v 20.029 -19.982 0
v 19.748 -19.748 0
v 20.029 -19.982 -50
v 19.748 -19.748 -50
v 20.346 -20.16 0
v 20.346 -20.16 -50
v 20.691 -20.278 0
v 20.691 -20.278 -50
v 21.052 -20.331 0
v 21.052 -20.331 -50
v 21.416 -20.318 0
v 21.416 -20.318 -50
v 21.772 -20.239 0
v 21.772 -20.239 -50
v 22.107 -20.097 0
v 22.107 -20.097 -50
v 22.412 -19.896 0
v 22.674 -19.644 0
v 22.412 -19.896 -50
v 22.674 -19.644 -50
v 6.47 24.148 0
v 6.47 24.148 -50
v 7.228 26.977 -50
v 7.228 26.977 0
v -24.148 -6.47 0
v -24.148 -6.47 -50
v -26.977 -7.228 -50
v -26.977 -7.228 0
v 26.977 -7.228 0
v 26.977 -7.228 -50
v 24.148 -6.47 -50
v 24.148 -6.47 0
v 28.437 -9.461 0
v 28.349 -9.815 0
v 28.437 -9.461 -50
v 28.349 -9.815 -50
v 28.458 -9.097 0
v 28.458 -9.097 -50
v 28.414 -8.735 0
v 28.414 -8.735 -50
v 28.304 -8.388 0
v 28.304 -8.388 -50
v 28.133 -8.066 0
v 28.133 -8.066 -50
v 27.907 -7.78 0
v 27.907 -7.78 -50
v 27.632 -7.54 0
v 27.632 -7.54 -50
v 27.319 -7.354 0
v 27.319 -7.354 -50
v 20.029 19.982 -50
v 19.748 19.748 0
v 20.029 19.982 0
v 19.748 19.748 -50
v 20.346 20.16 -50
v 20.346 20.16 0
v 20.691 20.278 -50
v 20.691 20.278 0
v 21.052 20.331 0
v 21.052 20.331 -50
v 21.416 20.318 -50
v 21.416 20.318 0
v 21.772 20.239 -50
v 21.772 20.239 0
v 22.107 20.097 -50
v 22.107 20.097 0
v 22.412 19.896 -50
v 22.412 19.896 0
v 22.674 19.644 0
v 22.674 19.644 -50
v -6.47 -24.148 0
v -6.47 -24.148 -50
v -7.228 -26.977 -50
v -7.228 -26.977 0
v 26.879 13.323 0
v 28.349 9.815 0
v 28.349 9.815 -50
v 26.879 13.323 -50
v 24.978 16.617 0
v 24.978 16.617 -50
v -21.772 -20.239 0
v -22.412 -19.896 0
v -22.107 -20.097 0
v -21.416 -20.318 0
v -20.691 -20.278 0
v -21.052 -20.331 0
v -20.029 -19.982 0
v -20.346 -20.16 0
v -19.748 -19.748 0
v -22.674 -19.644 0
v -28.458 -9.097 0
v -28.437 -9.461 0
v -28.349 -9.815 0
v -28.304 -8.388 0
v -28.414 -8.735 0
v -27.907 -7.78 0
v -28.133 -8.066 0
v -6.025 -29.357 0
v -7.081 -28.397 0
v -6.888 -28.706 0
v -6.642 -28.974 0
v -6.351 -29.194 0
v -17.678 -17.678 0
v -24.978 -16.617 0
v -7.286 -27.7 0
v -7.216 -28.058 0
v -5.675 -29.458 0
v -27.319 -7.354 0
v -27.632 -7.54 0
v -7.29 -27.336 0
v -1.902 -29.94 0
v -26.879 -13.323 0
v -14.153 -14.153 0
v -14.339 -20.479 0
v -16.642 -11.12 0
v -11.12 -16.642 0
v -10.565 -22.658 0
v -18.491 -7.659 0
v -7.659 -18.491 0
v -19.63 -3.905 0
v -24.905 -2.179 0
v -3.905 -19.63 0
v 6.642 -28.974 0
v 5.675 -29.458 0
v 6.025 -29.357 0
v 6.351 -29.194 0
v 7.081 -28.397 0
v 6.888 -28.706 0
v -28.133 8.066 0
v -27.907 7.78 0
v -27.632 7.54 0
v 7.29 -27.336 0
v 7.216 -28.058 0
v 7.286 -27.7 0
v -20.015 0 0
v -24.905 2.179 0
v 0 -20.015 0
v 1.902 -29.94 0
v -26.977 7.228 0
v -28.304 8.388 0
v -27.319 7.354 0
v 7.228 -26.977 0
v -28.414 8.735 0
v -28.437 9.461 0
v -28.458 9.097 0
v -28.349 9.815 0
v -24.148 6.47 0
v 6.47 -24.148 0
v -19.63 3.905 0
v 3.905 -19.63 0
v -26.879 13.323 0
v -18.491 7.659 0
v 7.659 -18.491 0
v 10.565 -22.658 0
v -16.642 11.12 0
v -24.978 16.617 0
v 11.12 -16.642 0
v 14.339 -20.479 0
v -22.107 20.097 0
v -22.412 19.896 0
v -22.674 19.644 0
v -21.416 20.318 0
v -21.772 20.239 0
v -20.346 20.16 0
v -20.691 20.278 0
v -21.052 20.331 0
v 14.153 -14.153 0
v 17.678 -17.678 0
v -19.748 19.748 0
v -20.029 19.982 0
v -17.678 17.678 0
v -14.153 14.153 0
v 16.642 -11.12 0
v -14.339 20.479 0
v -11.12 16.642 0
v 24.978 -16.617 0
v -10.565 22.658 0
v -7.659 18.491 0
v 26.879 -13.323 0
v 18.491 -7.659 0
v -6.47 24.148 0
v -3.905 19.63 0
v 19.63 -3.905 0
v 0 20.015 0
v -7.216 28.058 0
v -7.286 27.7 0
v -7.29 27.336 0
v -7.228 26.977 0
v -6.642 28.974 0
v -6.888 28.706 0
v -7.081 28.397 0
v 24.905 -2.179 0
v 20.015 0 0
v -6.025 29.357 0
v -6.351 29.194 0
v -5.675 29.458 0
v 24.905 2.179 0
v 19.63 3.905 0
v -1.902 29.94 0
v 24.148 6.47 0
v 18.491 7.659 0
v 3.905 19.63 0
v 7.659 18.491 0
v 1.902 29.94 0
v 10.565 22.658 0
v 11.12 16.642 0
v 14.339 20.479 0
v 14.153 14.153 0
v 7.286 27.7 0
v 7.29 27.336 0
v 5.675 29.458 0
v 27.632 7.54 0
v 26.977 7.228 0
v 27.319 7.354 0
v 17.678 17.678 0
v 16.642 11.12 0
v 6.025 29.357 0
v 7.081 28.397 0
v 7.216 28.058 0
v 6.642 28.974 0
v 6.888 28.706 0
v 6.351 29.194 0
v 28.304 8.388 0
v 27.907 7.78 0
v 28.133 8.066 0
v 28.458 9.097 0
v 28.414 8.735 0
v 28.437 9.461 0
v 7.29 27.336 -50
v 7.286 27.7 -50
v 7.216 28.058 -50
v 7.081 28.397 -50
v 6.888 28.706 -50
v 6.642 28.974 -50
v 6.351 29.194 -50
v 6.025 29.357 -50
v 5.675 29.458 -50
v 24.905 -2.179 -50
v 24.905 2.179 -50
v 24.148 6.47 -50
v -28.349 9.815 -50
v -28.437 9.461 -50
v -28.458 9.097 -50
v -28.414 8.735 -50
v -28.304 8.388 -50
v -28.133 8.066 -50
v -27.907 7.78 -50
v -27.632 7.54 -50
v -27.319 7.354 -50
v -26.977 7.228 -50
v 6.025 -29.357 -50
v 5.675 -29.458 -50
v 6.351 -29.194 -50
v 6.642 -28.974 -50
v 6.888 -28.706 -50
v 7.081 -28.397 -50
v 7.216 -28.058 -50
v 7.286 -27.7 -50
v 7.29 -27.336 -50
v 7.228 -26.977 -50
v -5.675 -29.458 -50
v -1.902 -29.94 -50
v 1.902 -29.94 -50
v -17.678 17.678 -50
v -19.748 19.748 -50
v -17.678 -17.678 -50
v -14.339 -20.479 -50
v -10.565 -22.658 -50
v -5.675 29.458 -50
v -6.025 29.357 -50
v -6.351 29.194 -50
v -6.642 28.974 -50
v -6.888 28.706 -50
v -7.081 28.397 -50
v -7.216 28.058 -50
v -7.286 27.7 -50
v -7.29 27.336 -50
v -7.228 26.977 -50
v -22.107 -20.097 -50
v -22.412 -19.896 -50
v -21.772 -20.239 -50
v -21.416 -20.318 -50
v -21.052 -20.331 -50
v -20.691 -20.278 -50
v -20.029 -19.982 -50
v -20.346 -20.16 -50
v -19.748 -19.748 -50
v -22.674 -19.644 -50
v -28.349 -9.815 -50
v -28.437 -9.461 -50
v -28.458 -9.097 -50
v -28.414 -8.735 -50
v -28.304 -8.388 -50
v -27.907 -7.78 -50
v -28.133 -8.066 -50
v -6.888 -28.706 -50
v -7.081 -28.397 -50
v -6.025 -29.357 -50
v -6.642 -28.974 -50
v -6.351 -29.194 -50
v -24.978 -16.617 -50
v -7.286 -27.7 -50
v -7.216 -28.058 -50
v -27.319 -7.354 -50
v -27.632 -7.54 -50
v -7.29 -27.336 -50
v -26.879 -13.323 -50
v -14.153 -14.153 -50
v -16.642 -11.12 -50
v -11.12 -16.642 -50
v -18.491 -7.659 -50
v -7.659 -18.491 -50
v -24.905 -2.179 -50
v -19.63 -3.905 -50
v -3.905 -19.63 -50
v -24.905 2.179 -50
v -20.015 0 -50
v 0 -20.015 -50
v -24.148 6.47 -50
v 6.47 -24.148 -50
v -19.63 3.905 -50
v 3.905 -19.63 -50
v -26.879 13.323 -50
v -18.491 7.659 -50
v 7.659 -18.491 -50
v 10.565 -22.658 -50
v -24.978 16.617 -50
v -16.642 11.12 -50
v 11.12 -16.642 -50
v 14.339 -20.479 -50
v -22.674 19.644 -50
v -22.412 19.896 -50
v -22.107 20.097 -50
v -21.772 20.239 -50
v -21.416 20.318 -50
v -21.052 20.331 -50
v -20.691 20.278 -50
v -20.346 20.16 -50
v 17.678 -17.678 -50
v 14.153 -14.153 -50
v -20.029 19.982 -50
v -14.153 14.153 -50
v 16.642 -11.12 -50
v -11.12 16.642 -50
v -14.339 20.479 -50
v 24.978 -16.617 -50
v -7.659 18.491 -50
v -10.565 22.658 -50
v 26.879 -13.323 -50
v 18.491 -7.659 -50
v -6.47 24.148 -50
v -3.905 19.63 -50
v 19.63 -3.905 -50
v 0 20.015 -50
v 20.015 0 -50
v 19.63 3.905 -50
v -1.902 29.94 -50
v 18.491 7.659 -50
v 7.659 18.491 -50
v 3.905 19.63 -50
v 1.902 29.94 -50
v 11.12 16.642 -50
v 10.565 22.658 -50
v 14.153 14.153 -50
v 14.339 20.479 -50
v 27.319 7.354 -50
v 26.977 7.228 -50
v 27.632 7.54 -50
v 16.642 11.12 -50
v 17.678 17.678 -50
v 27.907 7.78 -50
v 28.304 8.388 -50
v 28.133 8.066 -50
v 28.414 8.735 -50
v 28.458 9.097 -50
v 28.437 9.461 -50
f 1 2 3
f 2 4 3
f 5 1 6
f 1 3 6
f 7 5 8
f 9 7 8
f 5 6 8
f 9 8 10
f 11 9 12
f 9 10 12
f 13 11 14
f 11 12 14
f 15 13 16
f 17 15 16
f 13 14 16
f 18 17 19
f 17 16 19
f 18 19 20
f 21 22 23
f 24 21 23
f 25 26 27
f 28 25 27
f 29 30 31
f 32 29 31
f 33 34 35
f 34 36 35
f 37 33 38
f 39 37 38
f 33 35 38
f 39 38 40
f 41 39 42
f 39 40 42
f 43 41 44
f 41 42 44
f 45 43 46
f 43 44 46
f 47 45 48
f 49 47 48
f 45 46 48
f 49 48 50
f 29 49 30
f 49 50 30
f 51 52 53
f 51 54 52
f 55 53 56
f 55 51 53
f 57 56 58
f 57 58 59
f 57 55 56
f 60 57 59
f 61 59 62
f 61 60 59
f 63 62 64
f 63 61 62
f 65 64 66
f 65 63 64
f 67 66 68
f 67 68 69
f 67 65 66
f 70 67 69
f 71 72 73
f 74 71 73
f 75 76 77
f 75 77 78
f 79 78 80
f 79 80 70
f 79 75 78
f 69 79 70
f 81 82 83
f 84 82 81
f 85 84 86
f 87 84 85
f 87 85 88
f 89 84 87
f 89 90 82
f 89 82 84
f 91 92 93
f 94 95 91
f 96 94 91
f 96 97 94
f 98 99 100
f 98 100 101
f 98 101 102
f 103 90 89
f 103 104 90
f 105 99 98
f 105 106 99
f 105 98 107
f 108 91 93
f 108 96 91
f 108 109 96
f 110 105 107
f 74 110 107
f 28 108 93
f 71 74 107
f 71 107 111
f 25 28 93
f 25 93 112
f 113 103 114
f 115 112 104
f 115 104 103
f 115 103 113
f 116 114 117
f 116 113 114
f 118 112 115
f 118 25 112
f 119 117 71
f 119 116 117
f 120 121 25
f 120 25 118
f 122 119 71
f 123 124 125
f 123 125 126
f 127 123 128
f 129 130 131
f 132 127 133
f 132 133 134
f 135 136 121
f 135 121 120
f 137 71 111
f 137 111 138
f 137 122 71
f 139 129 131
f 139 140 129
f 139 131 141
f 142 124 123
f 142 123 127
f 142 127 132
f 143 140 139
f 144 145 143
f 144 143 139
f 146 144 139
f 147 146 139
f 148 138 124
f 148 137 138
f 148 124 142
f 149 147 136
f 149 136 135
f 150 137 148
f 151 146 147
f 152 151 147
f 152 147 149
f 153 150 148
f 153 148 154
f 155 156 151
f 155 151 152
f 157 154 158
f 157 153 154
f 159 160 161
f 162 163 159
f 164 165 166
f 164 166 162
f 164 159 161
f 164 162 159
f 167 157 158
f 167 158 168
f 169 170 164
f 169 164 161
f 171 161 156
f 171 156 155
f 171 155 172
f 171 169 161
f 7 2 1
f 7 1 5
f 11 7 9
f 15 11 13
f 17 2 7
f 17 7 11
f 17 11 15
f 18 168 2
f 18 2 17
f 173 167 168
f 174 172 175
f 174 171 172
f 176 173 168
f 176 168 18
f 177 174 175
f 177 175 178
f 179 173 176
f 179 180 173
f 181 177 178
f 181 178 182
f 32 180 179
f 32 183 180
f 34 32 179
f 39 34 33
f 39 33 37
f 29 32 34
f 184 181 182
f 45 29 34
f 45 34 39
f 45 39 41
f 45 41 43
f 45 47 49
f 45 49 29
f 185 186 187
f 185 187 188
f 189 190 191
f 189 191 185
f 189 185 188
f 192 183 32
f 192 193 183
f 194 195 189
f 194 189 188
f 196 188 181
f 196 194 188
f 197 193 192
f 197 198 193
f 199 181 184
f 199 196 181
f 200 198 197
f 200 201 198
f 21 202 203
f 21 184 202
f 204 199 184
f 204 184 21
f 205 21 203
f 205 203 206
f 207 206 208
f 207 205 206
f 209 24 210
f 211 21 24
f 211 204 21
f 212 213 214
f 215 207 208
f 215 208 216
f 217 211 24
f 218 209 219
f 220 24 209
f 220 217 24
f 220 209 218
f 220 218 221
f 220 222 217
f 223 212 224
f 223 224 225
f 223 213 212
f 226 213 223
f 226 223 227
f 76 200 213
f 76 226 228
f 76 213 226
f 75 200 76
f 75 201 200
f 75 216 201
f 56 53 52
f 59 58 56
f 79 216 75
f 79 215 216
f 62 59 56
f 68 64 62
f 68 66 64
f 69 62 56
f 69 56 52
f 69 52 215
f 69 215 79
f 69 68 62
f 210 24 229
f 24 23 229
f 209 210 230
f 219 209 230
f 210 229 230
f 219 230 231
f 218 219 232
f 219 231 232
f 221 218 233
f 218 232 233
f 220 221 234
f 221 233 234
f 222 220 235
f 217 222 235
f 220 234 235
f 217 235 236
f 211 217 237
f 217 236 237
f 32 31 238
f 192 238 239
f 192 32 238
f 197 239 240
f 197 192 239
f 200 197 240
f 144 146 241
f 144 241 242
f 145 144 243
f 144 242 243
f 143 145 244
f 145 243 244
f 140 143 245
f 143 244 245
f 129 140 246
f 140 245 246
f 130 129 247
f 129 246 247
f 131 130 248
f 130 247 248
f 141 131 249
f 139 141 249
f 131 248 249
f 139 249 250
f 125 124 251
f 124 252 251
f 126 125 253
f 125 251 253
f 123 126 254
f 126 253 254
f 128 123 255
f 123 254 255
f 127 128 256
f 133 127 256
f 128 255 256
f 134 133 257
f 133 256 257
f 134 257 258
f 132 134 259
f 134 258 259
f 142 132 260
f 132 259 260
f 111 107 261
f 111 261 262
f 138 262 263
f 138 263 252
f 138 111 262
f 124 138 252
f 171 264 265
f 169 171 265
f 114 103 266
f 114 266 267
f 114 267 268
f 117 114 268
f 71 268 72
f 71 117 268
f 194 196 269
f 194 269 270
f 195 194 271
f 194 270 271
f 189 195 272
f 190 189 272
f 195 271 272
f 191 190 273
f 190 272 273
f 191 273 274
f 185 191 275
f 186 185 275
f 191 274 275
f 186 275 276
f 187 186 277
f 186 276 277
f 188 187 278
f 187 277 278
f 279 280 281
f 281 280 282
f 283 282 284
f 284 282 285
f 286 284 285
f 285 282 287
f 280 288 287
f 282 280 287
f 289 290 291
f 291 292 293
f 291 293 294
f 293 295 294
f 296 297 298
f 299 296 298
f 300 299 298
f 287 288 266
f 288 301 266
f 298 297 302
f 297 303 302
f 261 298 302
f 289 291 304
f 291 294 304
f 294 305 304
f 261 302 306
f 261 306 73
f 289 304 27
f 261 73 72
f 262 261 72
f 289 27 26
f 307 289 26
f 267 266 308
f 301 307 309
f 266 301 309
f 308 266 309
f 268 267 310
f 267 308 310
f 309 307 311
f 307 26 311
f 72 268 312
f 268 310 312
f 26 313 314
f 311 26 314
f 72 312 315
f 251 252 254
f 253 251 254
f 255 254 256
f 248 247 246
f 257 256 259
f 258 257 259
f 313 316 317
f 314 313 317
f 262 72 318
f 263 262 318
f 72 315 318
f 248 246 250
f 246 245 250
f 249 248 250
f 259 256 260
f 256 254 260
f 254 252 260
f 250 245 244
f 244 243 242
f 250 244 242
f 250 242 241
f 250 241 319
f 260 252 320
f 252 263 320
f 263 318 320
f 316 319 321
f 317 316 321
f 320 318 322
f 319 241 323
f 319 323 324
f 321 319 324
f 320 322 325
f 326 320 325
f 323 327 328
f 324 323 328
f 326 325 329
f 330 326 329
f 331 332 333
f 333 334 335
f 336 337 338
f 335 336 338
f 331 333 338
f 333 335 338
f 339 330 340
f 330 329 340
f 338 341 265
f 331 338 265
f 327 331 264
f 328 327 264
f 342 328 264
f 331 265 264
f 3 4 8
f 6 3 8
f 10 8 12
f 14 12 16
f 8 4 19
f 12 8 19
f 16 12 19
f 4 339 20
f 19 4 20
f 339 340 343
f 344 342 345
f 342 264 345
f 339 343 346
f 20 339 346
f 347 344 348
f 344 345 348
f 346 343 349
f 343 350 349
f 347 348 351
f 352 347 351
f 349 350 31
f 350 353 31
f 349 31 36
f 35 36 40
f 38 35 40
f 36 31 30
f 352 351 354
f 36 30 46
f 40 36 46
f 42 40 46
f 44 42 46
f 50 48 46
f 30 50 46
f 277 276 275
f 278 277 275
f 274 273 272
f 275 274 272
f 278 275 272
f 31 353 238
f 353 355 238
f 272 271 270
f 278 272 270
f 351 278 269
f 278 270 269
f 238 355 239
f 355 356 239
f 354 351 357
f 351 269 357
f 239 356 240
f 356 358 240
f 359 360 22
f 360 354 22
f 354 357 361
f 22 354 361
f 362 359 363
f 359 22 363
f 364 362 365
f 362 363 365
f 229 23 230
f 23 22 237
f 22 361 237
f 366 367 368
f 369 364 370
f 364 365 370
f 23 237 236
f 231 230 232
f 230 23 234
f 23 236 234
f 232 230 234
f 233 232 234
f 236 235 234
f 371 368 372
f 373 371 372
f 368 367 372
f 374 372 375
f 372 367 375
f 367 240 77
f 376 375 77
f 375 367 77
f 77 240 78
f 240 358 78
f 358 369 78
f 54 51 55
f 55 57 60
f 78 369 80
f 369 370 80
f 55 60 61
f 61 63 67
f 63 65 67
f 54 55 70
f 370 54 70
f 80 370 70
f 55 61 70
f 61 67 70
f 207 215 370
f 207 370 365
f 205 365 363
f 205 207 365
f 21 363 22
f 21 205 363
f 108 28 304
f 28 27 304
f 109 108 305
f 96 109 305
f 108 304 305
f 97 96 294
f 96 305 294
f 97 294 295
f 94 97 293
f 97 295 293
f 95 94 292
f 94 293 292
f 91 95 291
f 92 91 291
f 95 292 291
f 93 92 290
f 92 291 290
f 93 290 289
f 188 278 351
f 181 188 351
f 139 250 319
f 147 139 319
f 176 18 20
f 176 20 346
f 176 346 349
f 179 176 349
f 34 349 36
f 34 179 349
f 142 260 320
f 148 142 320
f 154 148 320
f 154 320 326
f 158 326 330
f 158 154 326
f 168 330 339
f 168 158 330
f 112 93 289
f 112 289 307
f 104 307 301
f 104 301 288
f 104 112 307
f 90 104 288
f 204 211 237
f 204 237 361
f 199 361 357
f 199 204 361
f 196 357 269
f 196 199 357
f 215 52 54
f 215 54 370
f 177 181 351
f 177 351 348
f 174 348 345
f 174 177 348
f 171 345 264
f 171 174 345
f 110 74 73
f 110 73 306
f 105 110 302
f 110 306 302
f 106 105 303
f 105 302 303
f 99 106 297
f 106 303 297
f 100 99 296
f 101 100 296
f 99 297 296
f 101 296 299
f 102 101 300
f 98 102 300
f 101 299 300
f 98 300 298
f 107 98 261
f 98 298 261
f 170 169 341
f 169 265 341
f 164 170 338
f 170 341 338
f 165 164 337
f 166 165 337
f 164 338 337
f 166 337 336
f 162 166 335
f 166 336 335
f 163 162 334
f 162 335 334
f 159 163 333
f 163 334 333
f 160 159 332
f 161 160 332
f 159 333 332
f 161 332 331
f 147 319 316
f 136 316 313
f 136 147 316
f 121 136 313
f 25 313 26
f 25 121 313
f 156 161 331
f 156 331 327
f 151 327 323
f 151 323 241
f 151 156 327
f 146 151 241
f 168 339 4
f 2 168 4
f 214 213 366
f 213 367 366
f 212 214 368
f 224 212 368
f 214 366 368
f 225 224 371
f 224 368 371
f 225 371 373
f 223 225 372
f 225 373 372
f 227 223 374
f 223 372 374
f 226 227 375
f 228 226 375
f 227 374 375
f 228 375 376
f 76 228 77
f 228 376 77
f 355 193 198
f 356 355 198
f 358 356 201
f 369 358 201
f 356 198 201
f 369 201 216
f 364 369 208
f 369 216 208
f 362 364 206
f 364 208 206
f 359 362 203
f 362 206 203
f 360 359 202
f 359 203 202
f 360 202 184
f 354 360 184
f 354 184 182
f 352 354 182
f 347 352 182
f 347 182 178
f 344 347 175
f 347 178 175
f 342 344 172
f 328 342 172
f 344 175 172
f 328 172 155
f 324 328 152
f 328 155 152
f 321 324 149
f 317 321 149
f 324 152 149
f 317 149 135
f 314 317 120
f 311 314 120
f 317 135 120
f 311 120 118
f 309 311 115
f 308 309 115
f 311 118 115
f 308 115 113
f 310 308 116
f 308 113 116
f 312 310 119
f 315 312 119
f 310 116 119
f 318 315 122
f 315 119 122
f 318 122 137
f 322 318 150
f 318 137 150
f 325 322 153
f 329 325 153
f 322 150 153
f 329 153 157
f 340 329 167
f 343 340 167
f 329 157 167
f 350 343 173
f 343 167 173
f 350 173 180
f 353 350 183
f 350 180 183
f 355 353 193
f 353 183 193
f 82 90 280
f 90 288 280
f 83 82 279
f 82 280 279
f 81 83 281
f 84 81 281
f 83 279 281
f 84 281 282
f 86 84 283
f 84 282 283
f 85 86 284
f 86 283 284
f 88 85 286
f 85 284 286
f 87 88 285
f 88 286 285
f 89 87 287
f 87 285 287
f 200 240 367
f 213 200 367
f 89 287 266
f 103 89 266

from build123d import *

# Parameters (mm, degrees)
SKETCH1_R                = 25
SKETCH1_R_2              = 20.015
BOSS_EXTRUDE1_DEPTH      = 50
BOSS_EXTRUDE2_DEPTH      = 50
FILLET1_R                = 2
CIRPATTERN1_COUNT        = 6
FILLET1_OF_CIRPATTERN1_R = 2


with BuildPart() as part:
    # Sketch1 → Boss-Extrude1 (new body)
    with BuildSketch(Plane.XY):
        Circle(SKETCH1_R)
        Circle(SKETCH1_R_2, mode=Mode.SUBTRACT)
    extrude(amount=-BOSS_EXTRUDE1_DEPTH)

    # Sketch2 → Boss-Extrude2 (add)
    with BuildSketch(Plane.XY):
        with BuildLine():
            Line((6.470476128, 24.148145657), (7.764571353, 28.977774789))
            ThreePointArc((7.764571353, 28.977774789), (0, 30), (-7.764571353, 28.977774789))
            Line((-7.764571353, 28.977774789), (-6.470476128, 24.148145657))
            ThreePointArc((-6.470476128, 24.148145657), (0, 25), (6.470476128, 24.148145657))
        make_face()
    boss_extrude2 = extrude(amount=-BOSS_EXTRUDE2_DEPTH)

    # Fillet1
    fillet1_edges = [part.edges().sort_by_distance(p)[0] for p in [
        (-7.764571353, 28.977774789, -25),
        (7.764571353, 28.977774789, -25),
    ]]
    fillet(fillet1_edges, radius=FILLET1_R)

    # CirPattern1: Boss-Extrude2 ×6 about axis
    cirpattern1_axis = Axis((0, 0, 0), (0, 0, 1))
    for i in range(1, CIRPATTERN1_COUNT):
        add(boss_extrude2.rotate(cirpattern1_axis, i * 360 / CIRPATTERN1_COUNT))

    # Fillet1 of CirPattern1
    fillet1_of_cirpattern1_edges = [part.edges().sort_by_distance(p)[0] for p in [
        (-28.977774789, 7.764571353, -25),
        (-21.213203436, 21.213203436, -25),
        (-21.213203436, -21.213203436, -25),
        (-28.977774789, -7.764571353, -25),
        (7.764571353, -28.977774789, -25),
        (-7.764571353, -28.977774789, -25),
        (28.977774789, -7.764571353, -25),
        (21.213203436, -21.213203436, -25),
        (21.213203436, 21.213203436, -25),
        (28.977774789, 7.764571353, -25),
    ]]
    fillet(fillet1_of_cirpattern1_edges, radius=FILLET1_OF_CIRPATTERN1_R)


solid = part.part
